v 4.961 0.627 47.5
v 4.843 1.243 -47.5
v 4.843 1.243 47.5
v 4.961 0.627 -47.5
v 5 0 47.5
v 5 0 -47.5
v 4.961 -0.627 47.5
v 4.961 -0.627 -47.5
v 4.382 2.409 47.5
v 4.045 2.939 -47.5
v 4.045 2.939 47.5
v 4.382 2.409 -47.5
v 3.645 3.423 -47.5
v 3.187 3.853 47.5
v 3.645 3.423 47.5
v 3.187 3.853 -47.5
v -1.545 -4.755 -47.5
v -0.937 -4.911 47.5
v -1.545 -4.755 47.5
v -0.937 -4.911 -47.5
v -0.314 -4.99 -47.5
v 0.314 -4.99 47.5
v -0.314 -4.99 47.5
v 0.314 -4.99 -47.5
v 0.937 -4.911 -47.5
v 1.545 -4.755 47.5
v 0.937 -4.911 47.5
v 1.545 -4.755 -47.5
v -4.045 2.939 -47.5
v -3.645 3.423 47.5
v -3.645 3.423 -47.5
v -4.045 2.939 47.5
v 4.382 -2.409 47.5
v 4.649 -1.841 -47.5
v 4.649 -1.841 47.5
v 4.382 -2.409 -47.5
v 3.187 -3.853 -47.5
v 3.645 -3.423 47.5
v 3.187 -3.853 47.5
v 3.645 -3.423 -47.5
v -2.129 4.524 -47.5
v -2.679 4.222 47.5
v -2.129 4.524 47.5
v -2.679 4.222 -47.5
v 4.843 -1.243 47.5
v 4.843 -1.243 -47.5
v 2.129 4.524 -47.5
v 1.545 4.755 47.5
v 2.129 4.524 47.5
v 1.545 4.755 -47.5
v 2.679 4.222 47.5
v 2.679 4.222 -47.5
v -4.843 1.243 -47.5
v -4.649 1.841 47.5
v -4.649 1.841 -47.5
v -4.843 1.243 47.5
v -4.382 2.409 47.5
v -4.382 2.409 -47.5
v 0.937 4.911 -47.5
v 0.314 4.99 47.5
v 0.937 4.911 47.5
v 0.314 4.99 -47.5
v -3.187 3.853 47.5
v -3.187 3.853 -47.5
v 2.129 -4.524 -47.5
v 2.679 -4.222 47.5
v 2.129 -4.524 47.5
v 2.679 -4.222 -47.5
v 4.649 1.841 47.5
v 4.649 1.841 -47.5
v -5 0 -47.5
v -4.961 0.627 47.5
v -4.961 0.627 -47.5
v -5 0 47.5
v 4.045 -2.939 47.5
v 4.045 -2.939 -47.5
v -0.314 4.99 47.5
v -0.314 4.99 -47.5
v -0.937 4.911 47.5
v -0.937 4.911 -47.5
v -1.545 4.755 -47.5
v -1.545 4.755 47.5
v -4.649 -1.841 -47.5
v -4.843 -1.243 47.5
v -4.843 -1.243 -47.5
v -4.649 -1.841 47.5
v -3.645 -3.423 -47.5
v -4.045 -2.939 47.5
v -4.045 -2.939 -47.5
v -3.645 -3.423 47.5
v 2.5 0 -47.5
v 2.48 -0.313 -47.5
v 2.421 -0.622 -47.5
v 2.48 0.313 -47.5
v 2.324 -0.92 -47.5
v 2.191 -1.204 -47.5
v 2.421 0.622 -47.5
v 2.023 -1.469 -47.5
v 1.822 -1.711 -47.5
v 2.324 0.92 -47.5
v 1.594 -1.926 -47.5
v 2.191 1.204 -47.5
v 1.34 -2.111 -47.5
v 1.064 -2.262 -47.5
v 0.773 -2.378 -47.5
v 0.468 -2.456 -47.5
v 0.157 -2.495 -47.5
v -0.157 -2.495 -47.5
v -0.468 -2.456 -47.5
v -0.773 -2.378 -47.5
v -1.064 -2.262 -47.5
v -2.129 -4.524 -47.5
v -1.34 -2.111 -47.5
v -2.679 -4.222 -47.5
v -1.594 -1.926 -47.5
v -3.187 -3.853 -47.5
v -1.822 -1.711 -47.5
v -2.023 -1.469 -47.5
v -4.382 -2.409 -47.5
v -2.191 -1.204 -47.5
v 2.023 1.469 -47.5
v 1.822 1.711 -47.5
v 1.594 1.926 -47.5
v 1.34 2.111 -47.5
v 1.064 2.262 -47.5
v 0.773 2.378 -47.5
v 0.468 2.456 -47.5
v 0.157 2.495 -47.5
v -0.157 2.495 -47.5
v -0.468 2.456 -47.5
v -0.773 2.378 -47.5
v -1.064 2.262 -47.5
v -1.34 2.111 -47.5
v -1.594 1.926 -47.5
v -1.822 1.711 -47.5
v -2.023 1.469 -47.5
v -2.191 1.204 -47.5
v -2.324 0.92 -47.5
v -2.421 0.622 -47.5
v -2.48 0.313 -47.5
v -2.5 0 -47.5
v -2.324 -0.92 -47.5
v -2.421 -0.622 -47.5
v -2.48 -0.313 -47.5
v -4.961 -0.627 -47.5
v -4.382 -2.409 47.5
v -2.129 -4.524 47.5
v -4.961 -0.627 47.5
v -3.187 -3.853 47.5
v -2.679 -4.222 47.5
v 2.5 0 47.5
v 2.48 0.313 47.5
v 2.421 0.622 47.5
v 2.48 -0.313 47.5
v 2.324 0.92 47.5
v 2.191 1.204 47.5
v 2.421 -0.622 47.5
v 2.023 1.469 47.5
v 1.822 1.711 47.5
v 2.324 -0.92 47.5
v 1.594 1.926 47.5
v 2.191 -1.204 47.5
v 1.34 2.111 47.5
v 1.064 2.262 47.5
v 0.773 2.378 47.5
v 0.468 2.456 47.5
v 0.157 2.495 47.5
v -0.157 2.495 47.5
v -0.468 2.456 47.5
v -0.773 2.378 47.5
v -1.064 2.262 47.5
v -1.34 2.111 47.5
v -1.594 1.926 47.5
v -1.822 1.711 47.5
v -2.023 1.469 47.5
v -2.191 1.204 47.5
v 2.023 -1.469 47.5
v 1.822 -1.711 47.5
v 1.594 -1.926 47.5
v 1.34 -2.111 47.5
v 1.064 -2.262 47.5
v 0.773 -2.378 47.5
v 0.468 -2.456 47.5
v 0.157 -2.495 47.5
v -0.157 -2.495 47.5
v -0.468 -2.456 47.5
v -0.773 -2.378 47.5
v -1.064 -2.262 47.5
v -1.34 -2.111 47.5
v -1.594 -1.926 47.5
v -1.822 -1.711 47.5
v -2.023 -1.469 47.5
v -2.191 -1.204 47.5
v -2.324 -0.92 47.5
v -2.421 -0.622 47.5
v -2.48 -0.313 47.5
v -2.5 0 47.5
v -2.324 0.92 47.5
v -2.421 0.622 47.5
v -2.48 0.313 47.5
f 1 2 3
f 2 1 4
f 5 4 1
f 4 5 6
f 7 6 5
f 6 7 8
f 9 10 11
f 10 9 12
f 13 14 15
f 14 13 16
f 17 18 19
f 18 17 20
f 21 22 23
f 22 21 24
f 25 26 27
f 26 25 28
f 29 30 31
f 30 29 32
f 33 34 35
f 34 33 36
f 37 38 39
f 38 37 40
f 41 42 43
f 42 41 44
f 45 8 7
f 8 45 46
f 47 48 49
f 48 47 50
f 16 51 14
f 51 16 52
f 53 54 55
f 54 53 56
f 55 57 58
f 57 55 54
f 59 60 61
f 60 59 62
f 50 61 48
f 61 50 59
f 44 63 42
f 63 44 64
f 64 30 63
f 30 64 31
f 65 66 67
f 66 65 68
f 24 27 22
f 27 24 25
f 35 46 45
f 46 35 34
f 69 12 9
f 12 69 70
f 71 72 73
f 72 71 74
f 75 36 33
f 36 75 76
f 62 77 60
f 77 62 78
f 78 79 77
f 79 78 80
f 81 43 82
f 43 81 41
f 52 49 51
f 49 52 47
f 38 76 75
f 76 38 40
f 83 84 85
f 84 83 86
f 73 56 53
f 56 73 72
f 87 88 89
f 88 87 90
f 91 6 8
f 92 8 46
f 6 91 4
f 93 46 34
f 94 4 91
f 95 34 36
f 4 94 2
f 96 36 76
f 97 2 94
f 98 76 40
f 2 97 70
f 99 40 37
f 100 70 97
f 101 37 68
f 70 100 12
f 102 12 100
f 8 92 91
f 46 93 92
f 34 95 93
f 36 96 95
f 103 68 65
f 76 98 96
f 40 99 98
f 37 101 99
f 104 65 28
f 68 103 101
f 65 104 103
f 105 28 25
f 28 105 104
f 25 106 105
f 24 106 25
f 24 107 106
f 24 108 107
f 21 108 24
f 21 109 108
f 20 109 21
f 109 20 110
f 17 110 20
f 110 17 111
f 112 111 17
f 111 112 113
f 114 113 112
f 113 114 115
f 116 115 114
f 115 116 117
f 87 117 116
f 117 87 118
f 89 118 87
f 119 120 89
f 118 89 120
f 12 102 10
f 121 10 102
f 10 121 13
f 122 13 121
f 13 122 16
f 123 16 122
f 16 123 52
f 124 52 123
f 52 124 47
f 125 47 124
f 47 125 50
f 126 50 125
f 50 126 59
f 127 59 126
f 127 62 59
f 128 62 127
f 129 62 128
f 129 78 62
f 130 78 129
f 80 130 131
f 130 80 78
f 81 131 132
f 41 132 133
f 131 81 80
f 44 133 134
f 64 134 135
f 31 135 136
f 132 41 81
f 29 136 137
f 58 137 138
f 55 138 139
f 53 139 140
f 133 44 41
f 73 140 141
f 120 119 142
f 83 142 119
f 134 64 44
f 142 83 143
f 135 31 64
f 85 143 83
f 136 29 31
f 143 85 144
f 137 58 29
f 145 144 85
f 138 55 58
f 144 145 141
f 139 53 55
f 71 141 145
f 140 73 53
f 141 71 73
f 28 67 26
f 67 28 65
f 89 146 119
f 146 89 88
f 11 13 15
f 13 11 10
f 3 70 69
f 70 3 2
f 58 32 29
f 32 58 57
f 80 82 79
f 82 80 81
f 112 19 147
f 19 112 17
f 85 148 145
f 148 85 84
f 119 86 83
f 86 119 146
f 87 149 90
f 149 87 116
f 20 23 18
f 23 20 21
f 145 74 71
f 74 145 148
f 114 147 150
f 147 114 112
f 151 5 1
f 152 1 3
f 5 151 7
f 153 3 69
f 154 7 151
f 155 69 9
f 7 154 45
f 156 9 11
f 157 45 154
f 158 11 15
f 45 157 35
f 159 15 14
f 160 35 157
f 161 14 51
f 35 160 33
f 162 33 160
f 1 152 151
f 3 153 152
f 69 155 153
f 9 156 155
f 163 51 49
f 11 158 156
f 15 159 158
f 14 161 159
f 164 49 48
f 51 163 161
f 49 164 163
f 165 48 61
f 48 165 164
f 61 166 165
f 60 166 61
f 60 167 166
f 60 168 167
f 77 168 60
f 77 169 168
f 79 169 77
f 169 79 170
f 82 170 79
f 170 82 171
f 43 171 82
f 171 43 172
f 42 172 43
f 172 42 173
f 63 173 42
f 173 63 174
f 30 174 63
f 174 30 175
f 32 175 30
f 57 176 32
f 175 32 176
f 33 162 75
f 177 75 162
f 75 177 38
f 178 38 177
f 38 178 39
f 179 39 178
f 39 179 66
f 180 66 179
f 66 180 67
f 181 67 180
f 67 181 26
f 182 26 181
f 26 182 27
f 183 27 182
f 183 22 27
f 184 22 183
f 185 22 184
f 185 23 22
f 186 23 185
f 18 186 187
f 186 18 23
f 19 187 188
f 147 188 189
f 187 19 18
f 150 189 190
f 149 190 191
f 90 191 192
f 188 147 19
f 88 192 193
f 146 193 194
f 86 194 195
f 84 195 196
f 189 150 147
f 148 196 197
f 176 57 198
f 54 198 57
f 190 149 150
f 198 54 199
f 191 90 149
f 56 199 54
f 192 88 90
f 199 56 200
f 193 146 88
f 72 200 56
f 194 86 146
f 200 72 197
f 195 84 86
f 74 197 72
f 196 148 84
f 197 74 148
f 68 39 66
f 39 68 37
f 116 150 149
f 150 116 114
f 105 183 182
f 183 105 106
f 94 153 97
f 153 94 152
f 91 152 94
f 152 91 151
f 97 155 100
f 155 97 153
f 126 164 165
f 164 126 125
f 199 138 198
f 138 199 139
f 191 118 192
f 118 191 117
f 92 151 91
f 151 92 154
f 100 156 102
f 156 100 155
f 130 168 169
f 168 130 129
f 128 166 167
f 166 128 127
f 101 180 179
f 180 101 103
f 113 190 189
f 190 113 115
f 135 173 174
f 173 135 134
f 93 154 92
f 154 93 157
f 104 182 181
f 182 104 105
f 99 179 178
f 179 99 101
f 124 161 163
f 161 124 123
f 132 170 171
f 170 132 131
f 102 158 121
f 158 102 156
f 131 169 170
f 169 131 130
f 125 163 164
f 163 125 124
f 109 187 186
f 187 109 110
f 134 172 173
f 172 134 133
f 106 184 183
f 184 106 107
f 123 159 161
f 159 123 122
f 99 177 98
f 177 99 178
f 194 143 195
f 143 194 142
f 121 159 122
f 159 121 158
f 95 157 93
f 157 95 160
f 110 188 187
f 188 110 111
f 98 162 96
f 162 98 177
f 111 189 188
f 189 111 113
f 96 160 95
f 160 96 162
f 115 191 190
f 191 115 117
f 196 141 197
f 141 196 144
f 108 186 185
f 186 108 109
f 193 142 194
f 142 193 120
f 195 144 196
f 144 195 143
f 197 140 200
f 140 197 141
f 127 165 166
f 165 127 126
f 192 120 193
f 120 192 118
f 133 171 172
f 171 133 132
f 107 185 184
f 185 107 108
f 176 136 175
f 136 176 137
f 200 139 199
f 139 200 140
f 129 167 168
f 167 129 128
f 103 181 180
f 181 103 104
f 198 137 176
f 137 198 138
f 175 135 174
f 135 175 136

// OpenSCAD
$fn = 50;


difference() {
	union() {
		translate(v = [0, 0, -47.5000000000]) {
			cylinder(h = 95, r = 5.0000000000);
		}
	}
	union() {
		translate(v = [0, 0, -100.0000000000]) {
			cylinder(h = 200, r = 2.5000000000);
		}
	}
}
